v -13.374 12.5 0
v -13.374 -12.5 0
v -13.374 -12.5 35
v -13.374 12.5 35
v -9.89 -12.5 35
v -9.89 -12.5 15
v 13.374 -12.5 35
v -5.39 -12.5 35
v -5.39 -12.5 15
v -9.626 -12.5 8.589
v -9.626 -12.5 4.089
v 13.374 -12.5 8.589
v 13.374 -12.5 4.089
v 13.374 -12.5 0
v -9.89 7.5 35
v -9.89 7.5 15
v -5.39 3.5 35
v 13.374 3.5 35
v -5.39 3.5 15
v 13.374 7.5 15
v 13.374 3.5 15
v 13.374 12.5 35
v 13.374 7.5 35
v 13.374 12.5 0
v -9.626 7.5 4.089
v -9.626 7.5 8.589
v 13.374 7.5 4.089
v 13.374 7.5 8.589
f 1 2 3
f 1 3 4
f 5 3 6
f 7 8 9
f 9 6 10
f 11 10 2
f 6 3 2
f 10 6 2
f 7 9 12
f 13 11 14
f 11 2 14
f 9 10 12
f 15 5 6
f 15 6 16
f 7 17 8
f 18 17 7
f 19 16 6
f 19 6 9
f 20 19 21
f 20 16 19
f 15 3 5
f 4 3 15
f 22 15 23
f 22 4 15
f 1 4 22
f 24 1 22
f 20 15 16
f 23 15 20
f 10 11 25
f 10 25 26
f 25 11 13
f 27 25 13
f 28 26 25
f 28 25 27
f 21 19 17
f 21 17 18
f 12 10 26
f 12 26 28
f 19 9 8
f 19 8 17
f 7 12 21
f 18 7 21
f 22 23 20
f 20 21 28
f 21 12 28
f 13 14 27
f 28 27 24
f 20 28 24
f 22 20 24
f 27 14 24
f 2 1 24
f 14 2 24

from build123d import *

# Parameters (mm, degrees)
F0_W     = 26.747306
F0_H     = 25
F1_DEPTH = 35
F2_W     = 4.5
F2_H     = 20
F3_DEPTH = 20
F4_W     = 19.263828
F4_H     = 4
F5_DEPTH = 20
F6_W     = 23
F6_H     = 4.5
F7_DEPTH = 20


with BuildPart() as f1:
    # F0 (on Top) → F1 (new body)
    with BuildSketch(Plane.XY):
        Rectangle(F0_W, F0_H)
    extrude(amount=F1_DEPTH)

    # F2 (on face) → F3 (cut)
    with BuildSketch(Plane.XY.offset(35)):
        with Locations((-7.640175, -2.5)):
            Rectangle(F2_W, F2_H)
    extrude(amount=-F3_DEPTH, mode=Mode.SUBTRACT)

    # F4 (on face) → F5 (cut)
    with BuildSketch(Plane.XY.offset(35)):
        with Locations((3.741739, 5.5)):
            Rectangle(F4_W, F4_H)
    extrude(amount=-F5_DEPTH, mode=Mode.SUBTRACT)

    # F6 (on face) → F7 (cut)
    with BuildSketch(Plane.XZ.offset(12.5)):
        with Locations((1.873653, 6.339478)):
            Rectangle(F6_W, F6_H)
    extrude(amount=-F7_DEPTH, mode=Mode.SUBTRACT)


solid = f1.part
